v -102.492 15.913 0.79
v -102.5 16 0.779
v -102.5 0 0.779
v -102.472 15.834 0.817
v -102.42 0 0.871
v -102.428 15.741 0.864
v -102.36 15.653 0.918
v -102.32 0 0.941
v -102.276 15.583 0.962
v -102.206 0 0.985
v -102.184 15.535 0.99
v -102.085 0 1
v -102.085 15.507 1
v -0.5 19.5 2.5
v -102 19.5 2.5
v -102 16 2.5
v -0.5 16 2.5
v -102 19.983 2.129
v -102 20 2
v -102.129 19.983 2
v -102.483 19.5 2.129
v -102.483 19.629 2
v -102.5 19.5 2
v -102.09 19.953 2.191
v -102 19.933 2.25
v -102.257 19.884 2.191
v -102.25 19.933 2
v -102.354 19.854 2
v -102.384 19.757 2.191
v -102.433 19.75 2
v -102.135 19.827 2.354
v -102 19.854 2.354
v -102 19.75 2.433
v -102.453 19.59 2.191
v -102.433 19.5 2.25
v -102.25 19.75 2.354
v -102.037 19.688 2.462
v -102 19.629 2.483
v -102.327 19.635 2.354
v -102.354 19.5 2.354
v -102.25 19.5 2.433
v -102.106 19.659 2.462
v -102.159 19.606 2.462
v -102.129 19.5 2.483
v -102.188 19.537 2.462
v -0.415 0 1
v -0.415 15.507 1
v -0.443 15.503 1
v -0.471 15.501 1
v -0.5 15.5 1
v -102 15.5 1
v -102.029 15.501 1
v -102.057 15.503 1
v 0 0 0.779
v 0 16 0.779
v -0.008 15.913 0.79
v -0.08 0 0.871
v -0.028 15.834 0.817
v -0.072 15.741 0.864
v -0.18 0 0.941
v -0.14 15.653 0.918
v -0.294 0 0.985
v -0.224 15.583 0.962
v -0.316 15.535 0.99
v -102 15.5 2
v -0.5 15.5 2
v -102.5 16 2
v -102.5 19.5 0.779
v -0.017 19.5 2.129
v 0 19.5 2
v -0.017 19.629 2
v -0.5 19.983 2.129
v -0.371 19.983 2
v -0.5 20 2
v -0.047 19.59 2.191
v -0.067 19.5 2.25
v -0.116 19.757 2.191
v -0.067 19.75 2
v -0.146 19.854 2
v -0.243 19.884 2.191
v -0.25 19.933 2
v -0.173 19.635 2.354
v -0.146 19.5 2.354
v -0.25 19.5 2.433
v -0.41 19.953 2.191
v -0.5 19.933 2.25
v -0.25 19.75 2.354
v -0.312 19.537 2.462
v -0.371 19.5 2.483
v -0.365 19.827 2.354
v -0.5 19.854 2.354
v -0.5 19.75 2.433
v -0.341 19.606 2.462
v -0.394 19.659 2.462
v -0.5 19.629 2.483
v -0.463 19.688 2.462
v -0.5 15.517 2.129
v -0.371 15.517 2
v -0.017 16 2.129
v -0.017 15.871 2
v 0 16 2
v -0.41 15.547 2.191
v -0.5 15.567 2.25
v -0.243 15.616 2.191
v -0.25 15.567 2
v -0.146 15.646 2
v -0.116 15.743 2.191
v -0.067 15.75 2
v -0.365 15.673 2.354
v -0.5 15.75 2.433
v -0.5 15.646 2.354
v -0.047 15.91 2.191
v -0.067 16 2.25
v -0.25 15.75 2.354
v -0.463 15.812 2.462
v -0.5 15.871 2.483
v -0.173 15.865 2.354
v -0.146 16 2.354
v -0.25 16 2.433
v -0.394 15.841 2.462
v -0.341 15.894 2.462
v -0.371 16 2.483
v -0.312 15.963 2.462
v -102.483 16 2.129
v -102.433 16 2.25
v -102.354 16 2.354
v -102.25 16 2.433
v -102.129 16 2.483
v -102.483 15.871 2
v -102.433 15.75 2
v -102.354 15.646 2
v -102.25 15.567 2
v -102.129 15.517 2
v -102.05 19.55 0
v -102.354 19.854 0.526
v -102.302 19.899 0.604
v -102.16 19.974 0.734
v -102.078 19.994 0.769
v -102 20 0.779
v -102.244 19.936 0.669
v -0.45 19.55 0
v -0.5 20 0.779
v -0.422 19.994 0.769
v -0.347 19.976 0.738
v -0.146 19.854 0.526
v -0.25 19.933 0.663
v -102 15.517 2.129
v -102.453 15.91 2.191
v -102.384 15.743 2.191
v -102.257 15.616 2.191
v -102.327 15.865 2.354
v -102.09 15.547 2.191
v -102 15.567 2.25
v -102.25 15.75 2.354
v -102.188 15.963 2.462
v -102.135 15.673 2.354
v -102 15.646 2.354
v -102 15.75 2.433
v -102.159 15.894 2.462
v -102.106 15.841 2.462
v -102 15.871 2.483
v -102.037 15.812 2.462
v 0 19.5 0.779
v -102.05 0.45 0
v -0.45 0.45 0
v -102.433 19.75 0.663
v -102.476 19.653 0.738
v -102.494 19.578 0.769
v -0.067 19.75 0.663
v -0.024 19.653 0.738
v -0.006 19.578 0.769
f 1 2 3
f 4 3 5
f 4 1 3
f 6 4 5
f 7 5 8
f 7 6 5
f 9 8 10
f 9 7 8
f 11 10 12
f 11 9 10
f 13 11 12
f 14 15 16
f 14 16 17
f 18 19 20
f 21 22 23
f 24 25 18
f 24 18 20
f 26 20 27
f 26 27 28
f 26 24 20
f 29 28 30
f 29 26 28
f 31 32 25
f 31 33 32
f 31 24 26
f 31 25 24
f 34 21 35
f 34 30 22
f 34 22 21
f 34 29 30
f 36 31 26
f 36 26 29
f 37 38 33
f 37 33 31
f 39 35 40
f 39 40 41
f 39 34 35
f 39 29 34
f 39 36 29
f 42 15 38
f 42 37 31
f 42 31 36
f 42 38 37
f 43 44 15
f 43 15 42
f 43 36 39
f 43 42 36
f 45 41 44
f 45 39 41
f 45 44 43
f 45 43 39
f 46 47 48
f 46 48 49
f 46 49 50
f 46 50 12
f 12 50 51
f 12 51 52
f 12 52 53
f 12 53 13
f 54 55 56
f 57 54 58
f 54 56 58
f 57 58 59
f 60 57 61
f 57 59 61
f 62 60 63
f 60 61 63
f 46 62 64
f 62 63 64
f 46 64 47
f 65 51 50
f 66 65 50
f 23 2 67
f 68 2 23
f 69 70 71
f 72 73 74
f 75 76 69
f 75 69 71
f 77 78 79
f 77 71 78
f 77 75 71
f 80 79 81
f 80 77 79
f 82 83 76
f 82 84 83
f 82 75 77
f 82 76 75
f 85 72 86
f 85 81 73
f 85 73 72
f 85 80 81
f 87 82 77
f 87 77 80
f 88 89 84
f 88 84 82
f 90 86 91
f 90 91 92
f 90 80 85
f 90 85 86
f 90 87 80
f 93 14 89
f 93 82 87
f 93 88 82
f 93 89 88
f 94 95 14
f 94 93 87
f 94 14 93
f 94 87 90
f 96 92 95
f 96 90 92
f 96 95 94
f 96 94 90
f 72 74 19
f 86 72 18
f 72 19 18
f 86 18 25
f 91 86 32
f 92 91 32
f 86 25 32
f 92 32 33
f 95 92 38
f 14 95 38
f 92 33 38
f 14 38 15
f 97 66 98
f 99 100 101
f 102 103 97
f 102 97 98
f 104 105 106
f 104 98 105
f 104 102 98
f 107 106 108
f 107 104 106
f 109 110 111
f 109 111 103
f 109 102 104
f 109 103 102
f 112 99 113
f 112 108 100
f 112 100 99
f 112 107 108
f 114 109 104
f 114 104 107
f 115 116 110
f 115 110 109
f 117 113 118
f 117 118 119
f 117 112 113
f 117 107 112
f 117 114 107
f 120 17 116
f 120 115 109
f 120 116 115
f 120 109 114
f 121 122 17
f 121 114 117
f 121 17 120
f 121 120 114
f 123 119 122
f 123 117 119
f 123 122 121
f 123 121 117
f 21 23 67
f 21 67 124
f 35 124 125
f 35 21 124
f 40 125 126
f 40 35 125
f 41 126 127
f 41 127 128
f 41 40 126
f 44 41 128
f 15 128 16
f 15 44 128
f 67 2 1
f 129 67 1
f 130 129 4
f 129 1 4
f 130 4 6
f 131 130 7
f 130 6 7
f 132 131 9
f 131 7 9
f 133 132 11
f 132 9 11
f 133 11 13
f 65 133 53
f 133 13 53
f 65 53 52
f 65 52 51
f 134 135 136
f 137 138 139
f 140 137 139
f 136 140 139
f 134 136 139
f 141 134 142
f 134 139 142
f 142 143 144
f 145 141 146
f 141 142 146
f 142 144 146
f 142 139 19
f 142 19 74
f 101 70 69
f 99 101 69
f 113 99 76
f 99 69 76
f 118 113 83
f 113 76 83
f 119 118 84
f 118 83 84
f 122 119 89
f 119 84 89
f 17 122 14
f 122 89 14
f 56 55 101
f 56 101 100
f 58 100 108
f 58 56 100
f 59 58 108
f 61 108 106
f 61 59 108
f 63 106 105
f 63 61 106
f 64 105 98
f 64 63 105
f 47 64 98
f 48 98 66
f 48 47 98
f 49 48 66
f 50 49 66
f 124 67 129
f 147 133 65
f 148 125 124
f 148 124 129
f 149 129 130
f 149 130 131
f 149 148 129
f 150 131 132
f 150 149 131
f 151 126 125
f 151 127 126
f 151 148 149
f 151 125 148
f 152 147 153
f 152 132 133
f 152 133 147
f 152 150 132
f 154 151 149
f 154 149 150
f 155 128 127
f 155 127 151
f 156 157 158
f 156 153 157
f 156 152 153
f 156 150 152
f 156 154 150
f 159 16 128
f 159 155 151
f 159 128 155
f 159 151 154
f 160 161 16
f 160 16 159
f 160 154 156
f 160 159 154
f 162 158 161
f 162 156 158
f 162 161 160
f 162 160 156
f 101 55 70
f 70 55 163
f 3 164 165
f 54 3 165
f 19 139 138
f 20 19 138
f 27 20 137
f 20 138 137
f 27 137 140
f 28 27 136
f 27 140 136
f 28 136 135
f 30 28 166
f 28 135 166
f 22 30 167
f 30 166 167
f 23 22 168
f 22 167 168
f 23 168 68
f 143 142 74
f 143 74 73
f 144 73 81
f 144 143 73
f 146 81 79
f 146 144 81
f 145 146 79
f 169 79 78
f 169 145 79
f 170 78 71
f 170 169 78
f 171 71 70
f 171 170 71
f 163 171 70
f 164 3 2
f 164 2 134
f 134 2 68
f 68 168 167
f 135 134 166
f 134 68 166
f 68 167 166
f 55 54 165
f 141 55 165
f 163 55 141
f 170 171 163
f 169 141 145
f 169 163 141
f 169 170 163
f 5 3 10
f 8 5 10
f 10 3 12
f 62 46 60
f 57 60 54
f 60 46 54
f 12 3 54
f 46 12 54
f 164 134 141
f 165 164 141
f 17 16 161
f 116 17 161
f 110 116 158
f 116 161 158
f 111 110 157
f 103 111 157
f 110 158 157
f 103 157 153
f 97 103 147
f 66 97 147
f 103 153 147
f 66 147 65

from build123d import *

# Parameters (mm, degrees)
F0_W         = 102.5
F0_H         = 20
F1_DEPTH     = 1
F2_W         = 102.5
F2_H         = 4.5
F3_DEPTH     = 1.5
F4_C1_SIZE2  = 0.45
F4_C1_SIZE   = 0.7794228634
F4_C2_SIZE2  = 0.7794228634
F4_C2_SIZE   = 0.45
F4_C3_SIZE2  = 0.7794228634
F4_C3_SIZE   = 0.45
F4_C4_SIZE2  = 0.7794228634
F4_C4_SIZE   = 0.45
F5_T1_DEPTH  = 2.4705771366
F5_T3_DEPTH  = 1
F5_T5_DEPTH  = 3.5
F5_T7_DEPTH  = 101.5
F5_T9_DEPTH  = 16.5365895505
F5_S13_W     = 0.51
F5_S13_H     = 0.51
F5_T14_DEPTH = 0.51
F5_S19_W     = 0.51
F5_S19_H     = 0.51
F5_T20_DEPTH = 0.51
F5_S25_W     = 0.51
F5_S25_H     = 0.51
F5_T26_DEPTH = 0.51
F5_S31_W     = 0.51
F5_S31_H     = 0.51
F5_T32_DEPTH = 0.51
F5_T39_DEPTH = 16.5365895505
F5_T43_DEPTH = 2.25
F5_T52_DEPTH = 16.5365895505
F5_T56_DEPTH = 2.25


# Not quite as in the source:
# - a fillet or chamfer that OpenCascade refuses, or shapes differently, is made with other operations: its cross-section is extruded or revolved along the edge and cut away or added


with BuildPart() as f1:
    # F0 (on Top) → F1 (new body)
    with BuildSketch(Plane.XY):
        with Locations((-51.25, 10)):
            Rectangle(F0_W, F0_H)
    extrude(amount=F1_DEPTH)

    # F2 (on face) → F3 (join)
    with BuildSketch(Plane.XY.offset(1)):
        with Locations((-51.25, 17.75)):
            Rectangle(F2_W, F2_H)
    extrude(amount=F3_DEPTH)

    # F4: chamfer of 0.45 x 0.7794228634 on 4 edges, made by hand

    # F4_c1
    f4_c1_edges = [f1.edges().sort_by_distance(p)[0] for p in [
        (-51.25, 0, 0),
    ]]
    f4_c1_side = f1.faces().sort_by_distance((-51.25, 0, 0.009))[0]
    chamfer(f4_c1_edges, length=F4_C1_SIZE, length2=F4_C1_SIZE2, reference=f4_c1_side)

    # F4_c2
    f4_c2_edges = [f1.edges().sort_by_distance(p)[0] for p in [
        (-51.25, 20, 0),
    ]]
    f4_c2_side = f1.faces().sort_by_distance((-51.25, 19.991, 0))[0]
    chamfer(f4_c2_edges, length=F4_C2_SIZE, length2=F4_C2_SIZE2, reference=f4_c2_side)

    # F4_c3
    f4_c3_edges = [f1.edges().sort_by_distance(p)[0] for p in [
        (0, 10, 0),
    ]]
    f4_c3_side = f1.faces().sort_by_distance((-0.009, 10, 0))[0]
    chamfer(f4_c3_edges, length=F4_C3_SIZE, length2=F4_C3_SIZE2, reference=f4_c3_side)

    # F4_c4
    f4_c4_edges = [f1.edges().sort_by_distance(p)[0] for p in [
        (-102.5, 10, 0),
    ]]
    f4_c4_side = f1.faces().sort_by_distance((-102.491, 10, 0))[0]
    chamfer(f4_c4_edges, length=F4_C4_SIZE, length2=F4_C4_SIZE2, reference=f4_c4_side)

    # F5: fillet of radius 0.5 on 10 edges, made by hand

    # F5_s2 → F5_t1 (cut)
    with BuildSketch(Plane.XY.offset(-0.4705771366)):
        with BuildLine():
            ThreePointArc((-102, 20), (-102.3535533906, 19.8535533906), (-102.5, 19.5))
            Line((-102.5, 19.5), (-102.5, 20))
            Line((-102.5, 20), (-102, 20))
        make_face()
        with BuildLine():
            ThreePointArc((-0.5, 20), (-0.1464466094, 19.8535533906), (0, 19.5))
            Line((0, 19.5), (0, 20))
            Line((0, 20), (-0.5, 20))
        make_face()
    extrude(amount=F5_T1_DEPTH, mode=Mode.SUBTRACT)

    # F5_s4 → F5_t3 (cut)
    with BuildSketch(Plane.XY.offset(1)):
        with BuildLine():
            ThreePointArc((-102.5, 16), (-102.3535533906, 15.6464466094), (-102, 15.5))
            Line((-102, 15.5), (-102.5, 15.5))
            Line((-102.5, 15.5), (-102.5, 16))
        make_face()
        with BuildLine():
            ThreePointArc((0, 16), (-0.1464466094, 15.6464466094), (-0.5, 15.5))
            Line((-0.5, 15.5), (0, 15.5))
            Line((0, 15.5), (0, 16))
        make_face()
    extrude(amount=F5_T3_DEPTH, mode=Mode.SUBTRACT)

    # F5_s6 → F5_t5 (cut)
    with BuildSketch(Plane.XZ.offset(-19.5)):
        with BuildLine():
            ThreePointArc((-102.5, 2), (-102.3535533906, 2.3535533906), (-102, 2.5))
            Line((-102, 2.5), (-102.5, 2.5))
            Line((-102.5, 2.5), (-102.5, 2))
        make_face()
        with BuildLine():
            ThreePointArc((0, 2), (-0.1464466094, 2.3535533906), (-0.5, 2.5))
            Line((-0.5, 2.5), (0, 2.5))
            Line((0, 2.5), (0, 2))
        make_face()
    extrude(amount=F5_T5_DEPTH, mode=Mode.SUBTRACT)

    # F5_s8 → F5_t7 (cut)
    with BuildSketch(Plane.YZ.offset(-102)):
        with BuildLine():
            ThreePointArc((20, 2), (19.8535533906, 2.3535533906), (19.5, 2.5))
            Line((19.5, 2.5), (20, 2.5))
            Line((20, 2.5), (20, 2))
        make_face()
        with BuildLine():
            ThreePointArc((16, 2.5), (15.6464466094, 2.3535533906), (15.5, 2))
            Line((15.5, 2), (15.5, 2.5))
            Line((15.5, 2.5), (16, 2.5))
        make_face()
    extrude(amount=F5_T7_DEPTH, mode=Mode.SUBTRACT)

    # F5_s10 → F5_t9 (cut)
    with BuildSketch(Plane.XZ.offset(-15.5)):
        with BuildLine():
            ThreePointArc((-102.5, 0.7794228634), (-102.3201923811, 0.9414246435), (-102.0853641798, 1))
            Line((-102.0853641798, 1), (-102.5, 1))
            Line((-102.5, 1), (-102.5, 0.7794228634))
        make_face()
        with BuildLine():
            ThreePointArc((0, 0.7794228634), (-0.1798076189, 0.9414246435), (-0.4146358202, 1))
            Line((-0.4146358202, 1), (0, 1))
            Line((0, 1), (0, 0.7794228634))
        make_face()
    extrude(amount=F5_T9_DEPTH, mode=Mode.SUBTRACT)


with BuildPart() as f5_tool12:
    # F5_s13 → F5_t14 (new body)
    with BuildSketch(Plane.XY.offset(2)):
        with Locations((-102.255, 19.755)):
            Rectangle(F5_S13_W, F5_S13_H)
    extrude(amount=F5_T14_DEPTH)

    # F5_s15 → F5_t16 (revolve, cut)
    with BuildSketch(Plane(origin=(-102, 19.5, 2), x_dir=(0.7071067812, -0.7071067812, 0), z_dir=(-0.7071067812, -0.7071067812, 0))):
        with BuildLine():
            ThreePointArc((0, -0.5), (0.5, 0), (0, 0.5))
            Line((0, 0.5), (0, -0.5))
        make_face()
    revolve(axis=Axis((-102, 19.5, 2), (0, 0, 1)), mode=Mode.SUBTRACT)


with BuildPart() as f1_1:
    add(f1.part)

    # F5_t11: cut F5_tool12
    add(f5_tool12.part, mode=Mode.SUBTRACT)


with BuildPart() as f5_tool18:
    # F5_s19 → F5_t20 (new body)
    with BuildSketch(Plane.XY.offset(2)):
        with Locations((-102.255, 15.745)):
            Rectangle(F5_S19_W, F5_S19_H)
    extrude(amount=F5_T20_DEPTH)

    # F5_s21 → F5_t22 (revolve, cut)
    with BuildSketch(Plane(origin=(-102, 16, 2), x_dir=(0.7071067812, 0.7071067812, 0), z_dir=(0.7071067812, -0.7071067812, 0))):
        with BuildLine():
            ThreePointArc((0, -0.5), (0.5, 0), (0, 0.5))
            Line((0, 0.5), (0, -0.5))
        make_face()
    revolve(axis=Axis((-102, 16, 2), (0, 0, 1)), mode=Mode.SUBTRACT)


with BuildPart() as f1_2:
    add(f1_1.part)

    # F5_t17: cut F5_tool18
    add(f5_tool18.part, mode=Mode.SUBTRACT)


with BuildPart() as f5_tool24:
    # F5_s25 → F5_t26 (new body)
    with BuildSketch(Plane.XY.offset(2)):
        with Locations((-0.245, 19.755)):
            Rectangle(F5_S25_W, F5_S25_H)
    extrude(amount=F5_T26_DEPTH)

    # F5_s27 → F5_t28 (revolve, cut)
    with BuildSketch(Plane(origin=(-0.5, 19.5, 2), x_dir=(-0.7071067812, -0.7071067812, 0), z_dir=(-0.7071067812, 0.7071067812, 0))):
        with BuildLine():
            ThreePointArc((0, -0.5), (0.5, 0), (0, 0.5))
            Line((0, 0.5), (0, -0.5))
        make_face()
    revolve(axis=Axis((-0.5, 19.5, 2), (0, 0, 1)), mode=Mode.SUBTRACT)


with BuildPart() as f1_3:
    add(f1_2.part)

    # F5_t23: cut F5_tool24
    add(f5_tool24.part, mode=Mode.SUBTRACT)


with BuildPart() as f5_tool30:
    # F5_s31 → F5_t32 (new body)
    with BuildSketch(Plane.XY.offset(2)):
        with Locations((-0.245, 15.745)):
            Rectangle(F5_S31_W, F5_S31_H)
    extrude(amount=F5_T32_DEPTH)

    # F5_s33 → F5_t34 (revolve, cut)
    with BuildSketch(Plane(origin=(-0.5, 16, 2), x_dir=(-0.7071067812, 0.7071067812, 0), z_dir=(0.7071067812, 0.7071067812, 0))):
        with BuildLine():
            ThreePointArc((0, -0.5), (0.5, 0), (0, 0.5))
            Line((0, 0.5), (0, -0.5))
        make_face()
    revolve(axis=Axis((-0.5, 16, 2), (0, 0, 1)), mode=Mode.SUBTRACT)


with BuildPart() as f1_4:
    add(f1_3.part)

    # F5_t29: cut F5_tool30
    add(f5_tool30.part, mode=Mode.SUBTRACT)


with BuildPart() as f5_tool37:
    # F5_s38 → F5_t39 (new body)
    with BuildSketch(Plane.XZ.offset(-16.5365895505)):
        with BuildLine():
            ThreePointArc((-102.5, 0.7794228634), (-102.3201923811, 0.9414246435), (-102.0853641798, 1))
            Line((-102.0853641798, 1), (-102.5, 1))
            Line((-102.5, 1), (-102.5, 0.7794228634))
        make_face()
    extrude(amount=F5_T39_DEPTH)

    split(bisect_by=Plane.XZ.offset(-15.5), keep=Keep.BOTTOM)


with BuildPart() as f5_tool41:
    # F5_s42 → F5_t43 (new body)
    with BuildSketch(Plane.XY.offset(-0.25)):
        with BuildLine():
            ThreePointArc((-102.5, 16), (-102.3535533906, 15.6464466094), (-102, 15.5))
            Line((-102, 15.5), (-102.5, 15.5))
            Line((-102.5, 15.5), (-102.5, 16))
        make_face()
    extrude(amount=F5_T43_DEPTH)

    split(bisect_by=Plane.XY, keep=Keep.TOP)

    split(bisect_by=Plane(origin=(-76.5375, 0, -44.1889462281), x_dir=(0, 1, 0), z_dir=(0.8660254038, 0, 0.5)), keep=Keep.TOP)

    split(bisect_by=Plane.XY.offset(1), keep=Keep.BOTTOM)


with BuildPart() as f5_tool37_1:
    add(f5_tool37.part)

    # F5_t47: intersect F5_tool41
    add(f5_tool41.part, mode=Mode.INTERSECT)


with BuildPart() as f1_5:
    add(f1_4.part)

    # F5_t35: cut F5_tool37
    add(f5_tool37_1.part, mode=Mode.SUBTRACT)


with BuildPart() as f5_tool50:
    # F5_s51 → F5_t52 (new body)
    with BuildSketch(Plane.XZ):
        with BuildLine():
            ThreePointArc((0, 0.7794228634), (-0.1798076189, 0.9414246435), (-0.4146358202, 1))
            Line((-0.4146358202, 1), (0, 1))
            Line((0, 1), (0, 0.7794228634))
        make_face()
    extrude(amount=-F5_T52_DEPTH)

    split(bisect_by=Plane.XZ.offset(-15.5), keep=Keep.BOTTOM)


with BuildPart() as f5_tool54:
    # F5_s55 → F5_t56 (new body)
    with BuildSketch(Plane.XY.offset(-0.25)):
        with BuildLine():
            ThreePointArc((0, 16), (-0.1464466094, 15.6464466094), (-0.5, 15.5))
            Line((-0.5, 15.5), (0, 15.5))
            Line((0, 15.5), (0, 16))
        make_face()
    extrude(amount=F5_T56_DEPTH)

    split(bisect_by=Plane.XY, keep=Keep.TOP)

    split(bisect_by=Plane(origin=(-0.3375, 0, 0.1948557159), x_dir=(0, 1, 0), z_dir=(-0.8660254038, 0, 0.5)), keep=Keep.TOP)

    split(bisect_by=Plane.XY.offset(1), keep=Keep.BOTTOM)


with BuildPart() as f5_tool50_1:
    add(f5_tool50.part)

    # F5_t60: intersect F5_tool54
    add(f5_tool54.part, mode=Mode.INTERSECT)


with BuildPart() as f1_6:
    add(f1_5.part)

    # F5_t48: cut F5_tool50
    add(f5_tool50_1.part, mode=Mode.SUBTRACT)


solid = f1_6.part
